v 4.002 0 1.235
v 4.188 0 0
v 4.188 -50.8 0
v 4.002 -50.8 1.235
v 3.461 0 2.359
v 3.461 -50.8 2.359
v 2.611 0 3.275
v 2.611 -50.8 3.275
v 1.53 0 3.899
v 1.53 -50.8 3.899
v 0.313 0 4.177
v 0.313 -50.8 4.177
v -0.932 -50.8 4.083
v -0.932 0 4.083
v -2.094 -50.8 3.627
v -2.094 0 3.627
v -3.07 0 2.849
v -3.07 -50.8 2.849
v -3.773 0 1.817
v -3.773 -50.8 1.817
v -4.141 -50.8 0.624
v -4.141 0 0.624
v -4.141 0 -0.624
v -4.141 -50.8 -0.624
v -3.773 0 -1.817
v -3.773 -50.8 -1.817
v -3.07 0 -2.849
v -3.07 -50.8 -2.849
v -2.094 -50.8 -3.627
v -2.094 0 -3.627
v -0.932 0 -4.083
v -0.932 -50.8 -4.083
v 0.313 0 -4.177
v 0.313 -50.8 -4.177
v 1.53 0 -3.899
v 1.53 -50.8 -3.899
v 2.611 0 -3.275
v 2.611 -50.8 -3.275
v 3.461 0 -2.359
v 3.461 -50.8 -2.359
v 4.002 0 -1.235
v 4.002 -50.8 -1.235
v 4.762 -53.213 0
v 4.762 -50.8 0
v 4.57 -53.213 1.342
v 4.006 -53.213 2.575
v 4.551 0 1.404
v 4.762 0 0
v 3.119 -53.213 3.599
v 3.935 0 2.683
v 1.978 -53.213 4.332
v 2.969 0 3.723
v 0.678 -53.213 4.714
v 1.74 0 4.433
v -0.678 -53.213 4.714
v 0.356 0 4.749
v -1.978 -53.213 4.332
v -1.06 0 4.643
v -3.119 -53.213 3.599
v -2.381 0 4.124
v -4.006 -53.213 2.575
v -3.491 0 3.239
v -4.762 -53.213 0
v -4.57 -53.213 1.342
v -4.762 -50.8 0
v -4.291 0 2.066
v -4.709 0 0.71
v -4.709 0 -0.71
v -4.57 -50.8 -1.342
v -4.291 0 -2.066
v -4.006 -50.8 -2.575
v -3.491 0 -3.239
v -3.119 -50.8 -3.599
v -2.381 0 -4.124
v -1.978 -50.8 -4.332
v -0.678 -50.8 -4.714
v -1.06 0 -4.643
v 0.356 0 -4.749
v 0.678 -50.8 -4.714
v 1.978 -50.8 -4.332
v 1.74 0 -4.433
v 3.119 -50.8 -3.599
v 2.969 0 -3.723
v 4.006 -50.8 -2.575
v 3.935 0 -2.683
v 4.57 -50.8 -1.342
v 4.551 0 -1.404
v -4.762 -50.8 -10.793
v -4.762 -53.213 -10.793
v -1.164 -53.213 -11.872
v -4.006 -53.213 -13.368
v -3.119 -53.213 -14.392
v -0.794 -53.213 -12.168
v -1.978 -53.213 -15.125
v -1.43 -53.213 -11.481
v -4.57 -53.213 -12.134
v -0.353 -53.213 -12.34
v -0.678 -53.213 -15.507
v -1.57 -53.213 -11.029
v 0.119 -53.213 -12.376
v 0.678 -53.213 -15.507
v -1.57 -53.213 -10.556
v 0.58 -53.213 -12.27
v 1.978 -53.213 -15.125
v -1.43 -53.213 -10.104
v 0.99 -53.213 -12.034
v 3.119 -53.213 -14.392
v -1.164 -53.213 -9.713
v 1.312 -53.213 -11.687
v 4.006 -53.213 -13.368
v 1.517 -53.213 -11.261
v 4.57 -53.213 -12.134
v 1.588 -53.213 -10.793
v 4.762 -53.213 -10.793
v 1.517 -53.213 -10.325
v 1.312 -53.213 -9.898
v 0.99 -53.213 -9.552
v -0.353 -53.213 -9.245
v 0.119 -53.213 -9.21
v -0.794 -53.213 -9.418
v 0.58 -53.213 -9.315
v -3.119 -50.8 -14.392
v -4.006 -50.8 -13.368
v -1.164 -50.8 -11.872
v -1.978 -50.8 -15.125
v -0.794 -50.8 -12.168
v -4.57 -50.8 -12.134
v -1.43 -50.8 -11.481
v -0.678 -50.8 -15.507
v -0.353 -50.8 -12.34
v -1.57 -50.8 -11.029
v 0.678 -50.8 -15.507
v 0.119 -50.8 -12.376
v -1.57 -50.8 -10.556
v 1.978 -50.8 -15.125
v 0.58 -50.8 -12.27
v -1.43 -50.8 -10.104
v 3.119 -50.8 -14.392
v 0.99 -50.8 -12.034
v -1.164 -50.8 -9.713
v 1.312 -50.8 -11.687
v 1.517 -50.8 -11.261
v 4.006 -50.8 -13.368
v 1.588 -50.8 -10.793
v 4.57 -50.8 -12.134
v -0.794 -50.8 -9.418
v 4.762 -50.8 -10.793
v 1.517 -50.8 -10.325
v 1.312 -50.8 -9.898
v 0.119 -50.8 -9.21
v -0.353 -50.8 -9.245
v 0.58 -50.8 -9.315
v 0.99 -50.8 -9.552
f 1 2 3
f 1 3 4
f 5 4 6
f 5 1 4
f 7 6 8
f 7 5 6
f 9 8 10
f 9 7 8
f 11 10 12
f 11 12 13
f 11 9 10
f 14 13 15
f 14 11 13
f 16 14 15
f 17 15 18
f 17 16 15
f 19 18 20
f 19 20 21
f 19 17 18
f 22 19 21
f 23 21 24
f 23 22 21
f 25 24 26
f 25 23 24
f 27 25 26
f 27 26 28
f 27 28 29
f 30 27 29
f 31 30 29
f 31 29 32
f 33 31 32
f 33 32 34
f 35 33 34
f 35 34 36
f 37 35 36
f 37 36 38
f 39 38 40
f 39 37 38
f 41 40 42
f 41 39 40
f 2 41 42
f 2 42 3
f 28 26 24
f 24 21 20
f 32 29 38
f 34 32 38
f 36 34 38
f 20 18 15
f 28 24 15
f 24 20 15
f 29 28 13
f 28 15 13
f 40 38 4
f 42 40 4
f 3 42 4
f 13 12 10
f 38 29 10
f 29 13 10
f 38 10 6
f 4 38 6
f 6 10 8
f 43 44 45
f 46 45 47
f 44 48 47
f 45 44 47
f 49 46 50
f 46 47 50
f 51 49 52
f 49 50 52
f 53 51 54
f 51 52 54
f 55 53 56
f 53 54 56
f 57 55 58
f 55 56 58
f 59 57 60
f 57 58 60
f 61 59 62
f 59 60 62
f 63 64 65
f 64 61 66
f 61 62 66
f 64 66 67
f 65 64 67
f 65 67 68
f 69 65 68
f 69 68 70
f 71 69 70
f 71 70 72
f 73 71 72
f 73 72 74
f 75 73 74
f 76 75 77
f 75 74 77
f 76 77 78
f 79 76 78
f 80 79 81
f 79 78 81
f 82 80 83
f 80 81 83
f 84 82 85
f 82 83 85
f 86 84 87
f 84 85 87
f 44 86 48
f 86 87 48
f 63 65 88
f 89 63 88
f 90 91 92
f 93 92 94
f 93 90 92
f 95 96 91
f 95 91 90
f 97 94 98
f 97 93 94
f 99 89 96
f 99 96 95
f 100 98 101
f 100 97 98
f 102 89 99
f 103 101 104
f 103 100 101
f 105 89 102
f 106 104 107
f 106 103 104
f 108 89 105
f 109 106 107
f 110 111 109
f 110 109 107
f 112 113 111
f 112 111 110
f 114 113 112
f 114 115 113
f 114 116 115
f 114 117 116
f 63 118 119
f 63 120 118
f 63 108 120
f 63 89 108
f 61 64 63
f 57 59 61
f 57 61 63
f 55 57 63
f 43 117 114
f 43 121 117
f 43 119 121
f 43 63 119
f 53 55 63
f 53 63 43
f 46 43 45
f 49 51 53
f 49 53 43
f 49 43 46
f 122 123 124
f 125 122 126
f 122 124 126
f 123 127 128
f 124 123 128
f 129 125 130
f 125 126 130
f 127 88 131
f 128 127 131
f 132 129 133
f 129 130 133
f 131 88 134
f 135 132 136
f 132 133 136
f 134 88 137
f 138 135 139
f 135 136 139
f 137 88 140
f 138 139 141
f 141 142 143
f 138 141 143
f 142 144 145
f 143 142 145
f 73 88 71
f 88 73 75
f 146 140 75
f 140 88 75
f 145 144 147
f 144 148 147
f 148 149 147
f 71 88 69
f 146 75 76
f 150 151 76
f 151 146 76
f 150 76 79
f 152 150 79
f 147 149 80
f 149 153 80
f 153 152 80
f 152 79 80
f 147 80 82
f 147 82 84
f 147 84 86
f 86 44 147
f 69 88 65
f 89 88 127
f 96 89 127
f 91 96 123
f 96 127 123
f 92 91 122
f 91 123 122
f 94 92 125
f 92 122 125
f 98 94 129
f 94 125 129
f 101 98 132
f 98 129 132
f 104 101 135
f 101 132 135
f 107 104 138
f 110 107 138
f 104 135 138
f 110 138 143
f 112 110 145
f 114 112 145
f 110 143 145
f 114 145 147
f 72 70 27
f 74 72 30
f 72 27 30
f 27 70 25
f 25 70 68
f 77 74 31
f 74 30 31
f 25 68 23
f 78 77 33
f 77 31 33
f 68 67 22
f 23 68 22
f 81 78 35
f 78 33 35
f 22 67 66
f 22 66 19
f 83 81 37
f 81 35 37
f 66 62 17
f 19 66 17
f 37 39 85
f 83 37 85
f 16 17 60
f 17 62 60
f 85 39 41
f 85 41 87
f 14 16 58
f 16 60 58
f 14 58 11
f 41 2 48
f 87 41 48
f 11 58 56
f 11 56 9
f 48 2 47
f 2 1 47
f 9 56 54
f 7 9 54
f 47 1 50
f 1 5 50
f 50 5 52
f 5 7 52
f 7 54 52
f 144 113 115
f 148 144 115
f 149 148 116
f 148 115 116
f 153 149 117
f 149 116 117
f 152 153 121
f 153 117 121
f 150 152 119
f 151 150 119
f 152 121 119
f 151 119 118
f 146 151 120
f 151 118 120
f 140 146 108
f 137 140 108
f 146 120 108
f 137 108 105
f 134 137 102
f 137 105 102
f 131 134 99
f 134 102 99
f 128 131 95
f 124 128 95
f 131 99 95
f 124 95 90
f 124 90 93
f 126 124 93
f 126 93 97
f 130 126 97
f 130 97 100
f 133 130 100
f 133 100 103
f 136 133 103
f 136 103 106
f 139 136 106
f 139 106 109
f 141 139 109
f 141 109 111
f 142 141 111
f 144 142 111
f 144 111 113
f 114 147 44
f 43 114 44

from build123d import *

# Parameters (mm, degrees)
F0_R     = 4.7625
F0_R_2   = 4.188265
F1_DEPTH = 50.8
F3_DEPTH = 2.413
F4_R     = 1.5875
F5_DEPTH = 53.214


with BuildPart() as f1:
    # F0 (on Front) → F1 (new body)
    with BuildSketch(Plane.XZ):
        Circle(F0_R)
        Circle(F0_R_2, mode=Mode.SUBTRACT)
    extrude(amount=F1_DEPTH)

    # F2 (on face) → F3 (join)
    with BuildSketch(Plane.XZ.offset(50.8)):
        with BuildLine():
            Line((4.7625, -10.792703), (4.7625, 0))
            ThreePointArc((4.7625, 0), (0, 4.7625), (-4.7625, 0))
            Line((-4.7625, 0), (-4.7625, -10.792703))
            ThreePointArc((-4.7625, -10.792703), (0, -15.555203), (4.7625, -10.792703))
        make_face()
    extrude(amount=F3_DEPTH)

    # F4 (on face) → F5 (cut, through all)
    with BuildSketch(Plane.XZ.offset(53.213)):
        with Locations((0, -10.792703)):
            Circle(F4_R)
    extrude(amount=-F5_DEPTH, mode=Mode.SUBTRACT)


solid = f1.part
